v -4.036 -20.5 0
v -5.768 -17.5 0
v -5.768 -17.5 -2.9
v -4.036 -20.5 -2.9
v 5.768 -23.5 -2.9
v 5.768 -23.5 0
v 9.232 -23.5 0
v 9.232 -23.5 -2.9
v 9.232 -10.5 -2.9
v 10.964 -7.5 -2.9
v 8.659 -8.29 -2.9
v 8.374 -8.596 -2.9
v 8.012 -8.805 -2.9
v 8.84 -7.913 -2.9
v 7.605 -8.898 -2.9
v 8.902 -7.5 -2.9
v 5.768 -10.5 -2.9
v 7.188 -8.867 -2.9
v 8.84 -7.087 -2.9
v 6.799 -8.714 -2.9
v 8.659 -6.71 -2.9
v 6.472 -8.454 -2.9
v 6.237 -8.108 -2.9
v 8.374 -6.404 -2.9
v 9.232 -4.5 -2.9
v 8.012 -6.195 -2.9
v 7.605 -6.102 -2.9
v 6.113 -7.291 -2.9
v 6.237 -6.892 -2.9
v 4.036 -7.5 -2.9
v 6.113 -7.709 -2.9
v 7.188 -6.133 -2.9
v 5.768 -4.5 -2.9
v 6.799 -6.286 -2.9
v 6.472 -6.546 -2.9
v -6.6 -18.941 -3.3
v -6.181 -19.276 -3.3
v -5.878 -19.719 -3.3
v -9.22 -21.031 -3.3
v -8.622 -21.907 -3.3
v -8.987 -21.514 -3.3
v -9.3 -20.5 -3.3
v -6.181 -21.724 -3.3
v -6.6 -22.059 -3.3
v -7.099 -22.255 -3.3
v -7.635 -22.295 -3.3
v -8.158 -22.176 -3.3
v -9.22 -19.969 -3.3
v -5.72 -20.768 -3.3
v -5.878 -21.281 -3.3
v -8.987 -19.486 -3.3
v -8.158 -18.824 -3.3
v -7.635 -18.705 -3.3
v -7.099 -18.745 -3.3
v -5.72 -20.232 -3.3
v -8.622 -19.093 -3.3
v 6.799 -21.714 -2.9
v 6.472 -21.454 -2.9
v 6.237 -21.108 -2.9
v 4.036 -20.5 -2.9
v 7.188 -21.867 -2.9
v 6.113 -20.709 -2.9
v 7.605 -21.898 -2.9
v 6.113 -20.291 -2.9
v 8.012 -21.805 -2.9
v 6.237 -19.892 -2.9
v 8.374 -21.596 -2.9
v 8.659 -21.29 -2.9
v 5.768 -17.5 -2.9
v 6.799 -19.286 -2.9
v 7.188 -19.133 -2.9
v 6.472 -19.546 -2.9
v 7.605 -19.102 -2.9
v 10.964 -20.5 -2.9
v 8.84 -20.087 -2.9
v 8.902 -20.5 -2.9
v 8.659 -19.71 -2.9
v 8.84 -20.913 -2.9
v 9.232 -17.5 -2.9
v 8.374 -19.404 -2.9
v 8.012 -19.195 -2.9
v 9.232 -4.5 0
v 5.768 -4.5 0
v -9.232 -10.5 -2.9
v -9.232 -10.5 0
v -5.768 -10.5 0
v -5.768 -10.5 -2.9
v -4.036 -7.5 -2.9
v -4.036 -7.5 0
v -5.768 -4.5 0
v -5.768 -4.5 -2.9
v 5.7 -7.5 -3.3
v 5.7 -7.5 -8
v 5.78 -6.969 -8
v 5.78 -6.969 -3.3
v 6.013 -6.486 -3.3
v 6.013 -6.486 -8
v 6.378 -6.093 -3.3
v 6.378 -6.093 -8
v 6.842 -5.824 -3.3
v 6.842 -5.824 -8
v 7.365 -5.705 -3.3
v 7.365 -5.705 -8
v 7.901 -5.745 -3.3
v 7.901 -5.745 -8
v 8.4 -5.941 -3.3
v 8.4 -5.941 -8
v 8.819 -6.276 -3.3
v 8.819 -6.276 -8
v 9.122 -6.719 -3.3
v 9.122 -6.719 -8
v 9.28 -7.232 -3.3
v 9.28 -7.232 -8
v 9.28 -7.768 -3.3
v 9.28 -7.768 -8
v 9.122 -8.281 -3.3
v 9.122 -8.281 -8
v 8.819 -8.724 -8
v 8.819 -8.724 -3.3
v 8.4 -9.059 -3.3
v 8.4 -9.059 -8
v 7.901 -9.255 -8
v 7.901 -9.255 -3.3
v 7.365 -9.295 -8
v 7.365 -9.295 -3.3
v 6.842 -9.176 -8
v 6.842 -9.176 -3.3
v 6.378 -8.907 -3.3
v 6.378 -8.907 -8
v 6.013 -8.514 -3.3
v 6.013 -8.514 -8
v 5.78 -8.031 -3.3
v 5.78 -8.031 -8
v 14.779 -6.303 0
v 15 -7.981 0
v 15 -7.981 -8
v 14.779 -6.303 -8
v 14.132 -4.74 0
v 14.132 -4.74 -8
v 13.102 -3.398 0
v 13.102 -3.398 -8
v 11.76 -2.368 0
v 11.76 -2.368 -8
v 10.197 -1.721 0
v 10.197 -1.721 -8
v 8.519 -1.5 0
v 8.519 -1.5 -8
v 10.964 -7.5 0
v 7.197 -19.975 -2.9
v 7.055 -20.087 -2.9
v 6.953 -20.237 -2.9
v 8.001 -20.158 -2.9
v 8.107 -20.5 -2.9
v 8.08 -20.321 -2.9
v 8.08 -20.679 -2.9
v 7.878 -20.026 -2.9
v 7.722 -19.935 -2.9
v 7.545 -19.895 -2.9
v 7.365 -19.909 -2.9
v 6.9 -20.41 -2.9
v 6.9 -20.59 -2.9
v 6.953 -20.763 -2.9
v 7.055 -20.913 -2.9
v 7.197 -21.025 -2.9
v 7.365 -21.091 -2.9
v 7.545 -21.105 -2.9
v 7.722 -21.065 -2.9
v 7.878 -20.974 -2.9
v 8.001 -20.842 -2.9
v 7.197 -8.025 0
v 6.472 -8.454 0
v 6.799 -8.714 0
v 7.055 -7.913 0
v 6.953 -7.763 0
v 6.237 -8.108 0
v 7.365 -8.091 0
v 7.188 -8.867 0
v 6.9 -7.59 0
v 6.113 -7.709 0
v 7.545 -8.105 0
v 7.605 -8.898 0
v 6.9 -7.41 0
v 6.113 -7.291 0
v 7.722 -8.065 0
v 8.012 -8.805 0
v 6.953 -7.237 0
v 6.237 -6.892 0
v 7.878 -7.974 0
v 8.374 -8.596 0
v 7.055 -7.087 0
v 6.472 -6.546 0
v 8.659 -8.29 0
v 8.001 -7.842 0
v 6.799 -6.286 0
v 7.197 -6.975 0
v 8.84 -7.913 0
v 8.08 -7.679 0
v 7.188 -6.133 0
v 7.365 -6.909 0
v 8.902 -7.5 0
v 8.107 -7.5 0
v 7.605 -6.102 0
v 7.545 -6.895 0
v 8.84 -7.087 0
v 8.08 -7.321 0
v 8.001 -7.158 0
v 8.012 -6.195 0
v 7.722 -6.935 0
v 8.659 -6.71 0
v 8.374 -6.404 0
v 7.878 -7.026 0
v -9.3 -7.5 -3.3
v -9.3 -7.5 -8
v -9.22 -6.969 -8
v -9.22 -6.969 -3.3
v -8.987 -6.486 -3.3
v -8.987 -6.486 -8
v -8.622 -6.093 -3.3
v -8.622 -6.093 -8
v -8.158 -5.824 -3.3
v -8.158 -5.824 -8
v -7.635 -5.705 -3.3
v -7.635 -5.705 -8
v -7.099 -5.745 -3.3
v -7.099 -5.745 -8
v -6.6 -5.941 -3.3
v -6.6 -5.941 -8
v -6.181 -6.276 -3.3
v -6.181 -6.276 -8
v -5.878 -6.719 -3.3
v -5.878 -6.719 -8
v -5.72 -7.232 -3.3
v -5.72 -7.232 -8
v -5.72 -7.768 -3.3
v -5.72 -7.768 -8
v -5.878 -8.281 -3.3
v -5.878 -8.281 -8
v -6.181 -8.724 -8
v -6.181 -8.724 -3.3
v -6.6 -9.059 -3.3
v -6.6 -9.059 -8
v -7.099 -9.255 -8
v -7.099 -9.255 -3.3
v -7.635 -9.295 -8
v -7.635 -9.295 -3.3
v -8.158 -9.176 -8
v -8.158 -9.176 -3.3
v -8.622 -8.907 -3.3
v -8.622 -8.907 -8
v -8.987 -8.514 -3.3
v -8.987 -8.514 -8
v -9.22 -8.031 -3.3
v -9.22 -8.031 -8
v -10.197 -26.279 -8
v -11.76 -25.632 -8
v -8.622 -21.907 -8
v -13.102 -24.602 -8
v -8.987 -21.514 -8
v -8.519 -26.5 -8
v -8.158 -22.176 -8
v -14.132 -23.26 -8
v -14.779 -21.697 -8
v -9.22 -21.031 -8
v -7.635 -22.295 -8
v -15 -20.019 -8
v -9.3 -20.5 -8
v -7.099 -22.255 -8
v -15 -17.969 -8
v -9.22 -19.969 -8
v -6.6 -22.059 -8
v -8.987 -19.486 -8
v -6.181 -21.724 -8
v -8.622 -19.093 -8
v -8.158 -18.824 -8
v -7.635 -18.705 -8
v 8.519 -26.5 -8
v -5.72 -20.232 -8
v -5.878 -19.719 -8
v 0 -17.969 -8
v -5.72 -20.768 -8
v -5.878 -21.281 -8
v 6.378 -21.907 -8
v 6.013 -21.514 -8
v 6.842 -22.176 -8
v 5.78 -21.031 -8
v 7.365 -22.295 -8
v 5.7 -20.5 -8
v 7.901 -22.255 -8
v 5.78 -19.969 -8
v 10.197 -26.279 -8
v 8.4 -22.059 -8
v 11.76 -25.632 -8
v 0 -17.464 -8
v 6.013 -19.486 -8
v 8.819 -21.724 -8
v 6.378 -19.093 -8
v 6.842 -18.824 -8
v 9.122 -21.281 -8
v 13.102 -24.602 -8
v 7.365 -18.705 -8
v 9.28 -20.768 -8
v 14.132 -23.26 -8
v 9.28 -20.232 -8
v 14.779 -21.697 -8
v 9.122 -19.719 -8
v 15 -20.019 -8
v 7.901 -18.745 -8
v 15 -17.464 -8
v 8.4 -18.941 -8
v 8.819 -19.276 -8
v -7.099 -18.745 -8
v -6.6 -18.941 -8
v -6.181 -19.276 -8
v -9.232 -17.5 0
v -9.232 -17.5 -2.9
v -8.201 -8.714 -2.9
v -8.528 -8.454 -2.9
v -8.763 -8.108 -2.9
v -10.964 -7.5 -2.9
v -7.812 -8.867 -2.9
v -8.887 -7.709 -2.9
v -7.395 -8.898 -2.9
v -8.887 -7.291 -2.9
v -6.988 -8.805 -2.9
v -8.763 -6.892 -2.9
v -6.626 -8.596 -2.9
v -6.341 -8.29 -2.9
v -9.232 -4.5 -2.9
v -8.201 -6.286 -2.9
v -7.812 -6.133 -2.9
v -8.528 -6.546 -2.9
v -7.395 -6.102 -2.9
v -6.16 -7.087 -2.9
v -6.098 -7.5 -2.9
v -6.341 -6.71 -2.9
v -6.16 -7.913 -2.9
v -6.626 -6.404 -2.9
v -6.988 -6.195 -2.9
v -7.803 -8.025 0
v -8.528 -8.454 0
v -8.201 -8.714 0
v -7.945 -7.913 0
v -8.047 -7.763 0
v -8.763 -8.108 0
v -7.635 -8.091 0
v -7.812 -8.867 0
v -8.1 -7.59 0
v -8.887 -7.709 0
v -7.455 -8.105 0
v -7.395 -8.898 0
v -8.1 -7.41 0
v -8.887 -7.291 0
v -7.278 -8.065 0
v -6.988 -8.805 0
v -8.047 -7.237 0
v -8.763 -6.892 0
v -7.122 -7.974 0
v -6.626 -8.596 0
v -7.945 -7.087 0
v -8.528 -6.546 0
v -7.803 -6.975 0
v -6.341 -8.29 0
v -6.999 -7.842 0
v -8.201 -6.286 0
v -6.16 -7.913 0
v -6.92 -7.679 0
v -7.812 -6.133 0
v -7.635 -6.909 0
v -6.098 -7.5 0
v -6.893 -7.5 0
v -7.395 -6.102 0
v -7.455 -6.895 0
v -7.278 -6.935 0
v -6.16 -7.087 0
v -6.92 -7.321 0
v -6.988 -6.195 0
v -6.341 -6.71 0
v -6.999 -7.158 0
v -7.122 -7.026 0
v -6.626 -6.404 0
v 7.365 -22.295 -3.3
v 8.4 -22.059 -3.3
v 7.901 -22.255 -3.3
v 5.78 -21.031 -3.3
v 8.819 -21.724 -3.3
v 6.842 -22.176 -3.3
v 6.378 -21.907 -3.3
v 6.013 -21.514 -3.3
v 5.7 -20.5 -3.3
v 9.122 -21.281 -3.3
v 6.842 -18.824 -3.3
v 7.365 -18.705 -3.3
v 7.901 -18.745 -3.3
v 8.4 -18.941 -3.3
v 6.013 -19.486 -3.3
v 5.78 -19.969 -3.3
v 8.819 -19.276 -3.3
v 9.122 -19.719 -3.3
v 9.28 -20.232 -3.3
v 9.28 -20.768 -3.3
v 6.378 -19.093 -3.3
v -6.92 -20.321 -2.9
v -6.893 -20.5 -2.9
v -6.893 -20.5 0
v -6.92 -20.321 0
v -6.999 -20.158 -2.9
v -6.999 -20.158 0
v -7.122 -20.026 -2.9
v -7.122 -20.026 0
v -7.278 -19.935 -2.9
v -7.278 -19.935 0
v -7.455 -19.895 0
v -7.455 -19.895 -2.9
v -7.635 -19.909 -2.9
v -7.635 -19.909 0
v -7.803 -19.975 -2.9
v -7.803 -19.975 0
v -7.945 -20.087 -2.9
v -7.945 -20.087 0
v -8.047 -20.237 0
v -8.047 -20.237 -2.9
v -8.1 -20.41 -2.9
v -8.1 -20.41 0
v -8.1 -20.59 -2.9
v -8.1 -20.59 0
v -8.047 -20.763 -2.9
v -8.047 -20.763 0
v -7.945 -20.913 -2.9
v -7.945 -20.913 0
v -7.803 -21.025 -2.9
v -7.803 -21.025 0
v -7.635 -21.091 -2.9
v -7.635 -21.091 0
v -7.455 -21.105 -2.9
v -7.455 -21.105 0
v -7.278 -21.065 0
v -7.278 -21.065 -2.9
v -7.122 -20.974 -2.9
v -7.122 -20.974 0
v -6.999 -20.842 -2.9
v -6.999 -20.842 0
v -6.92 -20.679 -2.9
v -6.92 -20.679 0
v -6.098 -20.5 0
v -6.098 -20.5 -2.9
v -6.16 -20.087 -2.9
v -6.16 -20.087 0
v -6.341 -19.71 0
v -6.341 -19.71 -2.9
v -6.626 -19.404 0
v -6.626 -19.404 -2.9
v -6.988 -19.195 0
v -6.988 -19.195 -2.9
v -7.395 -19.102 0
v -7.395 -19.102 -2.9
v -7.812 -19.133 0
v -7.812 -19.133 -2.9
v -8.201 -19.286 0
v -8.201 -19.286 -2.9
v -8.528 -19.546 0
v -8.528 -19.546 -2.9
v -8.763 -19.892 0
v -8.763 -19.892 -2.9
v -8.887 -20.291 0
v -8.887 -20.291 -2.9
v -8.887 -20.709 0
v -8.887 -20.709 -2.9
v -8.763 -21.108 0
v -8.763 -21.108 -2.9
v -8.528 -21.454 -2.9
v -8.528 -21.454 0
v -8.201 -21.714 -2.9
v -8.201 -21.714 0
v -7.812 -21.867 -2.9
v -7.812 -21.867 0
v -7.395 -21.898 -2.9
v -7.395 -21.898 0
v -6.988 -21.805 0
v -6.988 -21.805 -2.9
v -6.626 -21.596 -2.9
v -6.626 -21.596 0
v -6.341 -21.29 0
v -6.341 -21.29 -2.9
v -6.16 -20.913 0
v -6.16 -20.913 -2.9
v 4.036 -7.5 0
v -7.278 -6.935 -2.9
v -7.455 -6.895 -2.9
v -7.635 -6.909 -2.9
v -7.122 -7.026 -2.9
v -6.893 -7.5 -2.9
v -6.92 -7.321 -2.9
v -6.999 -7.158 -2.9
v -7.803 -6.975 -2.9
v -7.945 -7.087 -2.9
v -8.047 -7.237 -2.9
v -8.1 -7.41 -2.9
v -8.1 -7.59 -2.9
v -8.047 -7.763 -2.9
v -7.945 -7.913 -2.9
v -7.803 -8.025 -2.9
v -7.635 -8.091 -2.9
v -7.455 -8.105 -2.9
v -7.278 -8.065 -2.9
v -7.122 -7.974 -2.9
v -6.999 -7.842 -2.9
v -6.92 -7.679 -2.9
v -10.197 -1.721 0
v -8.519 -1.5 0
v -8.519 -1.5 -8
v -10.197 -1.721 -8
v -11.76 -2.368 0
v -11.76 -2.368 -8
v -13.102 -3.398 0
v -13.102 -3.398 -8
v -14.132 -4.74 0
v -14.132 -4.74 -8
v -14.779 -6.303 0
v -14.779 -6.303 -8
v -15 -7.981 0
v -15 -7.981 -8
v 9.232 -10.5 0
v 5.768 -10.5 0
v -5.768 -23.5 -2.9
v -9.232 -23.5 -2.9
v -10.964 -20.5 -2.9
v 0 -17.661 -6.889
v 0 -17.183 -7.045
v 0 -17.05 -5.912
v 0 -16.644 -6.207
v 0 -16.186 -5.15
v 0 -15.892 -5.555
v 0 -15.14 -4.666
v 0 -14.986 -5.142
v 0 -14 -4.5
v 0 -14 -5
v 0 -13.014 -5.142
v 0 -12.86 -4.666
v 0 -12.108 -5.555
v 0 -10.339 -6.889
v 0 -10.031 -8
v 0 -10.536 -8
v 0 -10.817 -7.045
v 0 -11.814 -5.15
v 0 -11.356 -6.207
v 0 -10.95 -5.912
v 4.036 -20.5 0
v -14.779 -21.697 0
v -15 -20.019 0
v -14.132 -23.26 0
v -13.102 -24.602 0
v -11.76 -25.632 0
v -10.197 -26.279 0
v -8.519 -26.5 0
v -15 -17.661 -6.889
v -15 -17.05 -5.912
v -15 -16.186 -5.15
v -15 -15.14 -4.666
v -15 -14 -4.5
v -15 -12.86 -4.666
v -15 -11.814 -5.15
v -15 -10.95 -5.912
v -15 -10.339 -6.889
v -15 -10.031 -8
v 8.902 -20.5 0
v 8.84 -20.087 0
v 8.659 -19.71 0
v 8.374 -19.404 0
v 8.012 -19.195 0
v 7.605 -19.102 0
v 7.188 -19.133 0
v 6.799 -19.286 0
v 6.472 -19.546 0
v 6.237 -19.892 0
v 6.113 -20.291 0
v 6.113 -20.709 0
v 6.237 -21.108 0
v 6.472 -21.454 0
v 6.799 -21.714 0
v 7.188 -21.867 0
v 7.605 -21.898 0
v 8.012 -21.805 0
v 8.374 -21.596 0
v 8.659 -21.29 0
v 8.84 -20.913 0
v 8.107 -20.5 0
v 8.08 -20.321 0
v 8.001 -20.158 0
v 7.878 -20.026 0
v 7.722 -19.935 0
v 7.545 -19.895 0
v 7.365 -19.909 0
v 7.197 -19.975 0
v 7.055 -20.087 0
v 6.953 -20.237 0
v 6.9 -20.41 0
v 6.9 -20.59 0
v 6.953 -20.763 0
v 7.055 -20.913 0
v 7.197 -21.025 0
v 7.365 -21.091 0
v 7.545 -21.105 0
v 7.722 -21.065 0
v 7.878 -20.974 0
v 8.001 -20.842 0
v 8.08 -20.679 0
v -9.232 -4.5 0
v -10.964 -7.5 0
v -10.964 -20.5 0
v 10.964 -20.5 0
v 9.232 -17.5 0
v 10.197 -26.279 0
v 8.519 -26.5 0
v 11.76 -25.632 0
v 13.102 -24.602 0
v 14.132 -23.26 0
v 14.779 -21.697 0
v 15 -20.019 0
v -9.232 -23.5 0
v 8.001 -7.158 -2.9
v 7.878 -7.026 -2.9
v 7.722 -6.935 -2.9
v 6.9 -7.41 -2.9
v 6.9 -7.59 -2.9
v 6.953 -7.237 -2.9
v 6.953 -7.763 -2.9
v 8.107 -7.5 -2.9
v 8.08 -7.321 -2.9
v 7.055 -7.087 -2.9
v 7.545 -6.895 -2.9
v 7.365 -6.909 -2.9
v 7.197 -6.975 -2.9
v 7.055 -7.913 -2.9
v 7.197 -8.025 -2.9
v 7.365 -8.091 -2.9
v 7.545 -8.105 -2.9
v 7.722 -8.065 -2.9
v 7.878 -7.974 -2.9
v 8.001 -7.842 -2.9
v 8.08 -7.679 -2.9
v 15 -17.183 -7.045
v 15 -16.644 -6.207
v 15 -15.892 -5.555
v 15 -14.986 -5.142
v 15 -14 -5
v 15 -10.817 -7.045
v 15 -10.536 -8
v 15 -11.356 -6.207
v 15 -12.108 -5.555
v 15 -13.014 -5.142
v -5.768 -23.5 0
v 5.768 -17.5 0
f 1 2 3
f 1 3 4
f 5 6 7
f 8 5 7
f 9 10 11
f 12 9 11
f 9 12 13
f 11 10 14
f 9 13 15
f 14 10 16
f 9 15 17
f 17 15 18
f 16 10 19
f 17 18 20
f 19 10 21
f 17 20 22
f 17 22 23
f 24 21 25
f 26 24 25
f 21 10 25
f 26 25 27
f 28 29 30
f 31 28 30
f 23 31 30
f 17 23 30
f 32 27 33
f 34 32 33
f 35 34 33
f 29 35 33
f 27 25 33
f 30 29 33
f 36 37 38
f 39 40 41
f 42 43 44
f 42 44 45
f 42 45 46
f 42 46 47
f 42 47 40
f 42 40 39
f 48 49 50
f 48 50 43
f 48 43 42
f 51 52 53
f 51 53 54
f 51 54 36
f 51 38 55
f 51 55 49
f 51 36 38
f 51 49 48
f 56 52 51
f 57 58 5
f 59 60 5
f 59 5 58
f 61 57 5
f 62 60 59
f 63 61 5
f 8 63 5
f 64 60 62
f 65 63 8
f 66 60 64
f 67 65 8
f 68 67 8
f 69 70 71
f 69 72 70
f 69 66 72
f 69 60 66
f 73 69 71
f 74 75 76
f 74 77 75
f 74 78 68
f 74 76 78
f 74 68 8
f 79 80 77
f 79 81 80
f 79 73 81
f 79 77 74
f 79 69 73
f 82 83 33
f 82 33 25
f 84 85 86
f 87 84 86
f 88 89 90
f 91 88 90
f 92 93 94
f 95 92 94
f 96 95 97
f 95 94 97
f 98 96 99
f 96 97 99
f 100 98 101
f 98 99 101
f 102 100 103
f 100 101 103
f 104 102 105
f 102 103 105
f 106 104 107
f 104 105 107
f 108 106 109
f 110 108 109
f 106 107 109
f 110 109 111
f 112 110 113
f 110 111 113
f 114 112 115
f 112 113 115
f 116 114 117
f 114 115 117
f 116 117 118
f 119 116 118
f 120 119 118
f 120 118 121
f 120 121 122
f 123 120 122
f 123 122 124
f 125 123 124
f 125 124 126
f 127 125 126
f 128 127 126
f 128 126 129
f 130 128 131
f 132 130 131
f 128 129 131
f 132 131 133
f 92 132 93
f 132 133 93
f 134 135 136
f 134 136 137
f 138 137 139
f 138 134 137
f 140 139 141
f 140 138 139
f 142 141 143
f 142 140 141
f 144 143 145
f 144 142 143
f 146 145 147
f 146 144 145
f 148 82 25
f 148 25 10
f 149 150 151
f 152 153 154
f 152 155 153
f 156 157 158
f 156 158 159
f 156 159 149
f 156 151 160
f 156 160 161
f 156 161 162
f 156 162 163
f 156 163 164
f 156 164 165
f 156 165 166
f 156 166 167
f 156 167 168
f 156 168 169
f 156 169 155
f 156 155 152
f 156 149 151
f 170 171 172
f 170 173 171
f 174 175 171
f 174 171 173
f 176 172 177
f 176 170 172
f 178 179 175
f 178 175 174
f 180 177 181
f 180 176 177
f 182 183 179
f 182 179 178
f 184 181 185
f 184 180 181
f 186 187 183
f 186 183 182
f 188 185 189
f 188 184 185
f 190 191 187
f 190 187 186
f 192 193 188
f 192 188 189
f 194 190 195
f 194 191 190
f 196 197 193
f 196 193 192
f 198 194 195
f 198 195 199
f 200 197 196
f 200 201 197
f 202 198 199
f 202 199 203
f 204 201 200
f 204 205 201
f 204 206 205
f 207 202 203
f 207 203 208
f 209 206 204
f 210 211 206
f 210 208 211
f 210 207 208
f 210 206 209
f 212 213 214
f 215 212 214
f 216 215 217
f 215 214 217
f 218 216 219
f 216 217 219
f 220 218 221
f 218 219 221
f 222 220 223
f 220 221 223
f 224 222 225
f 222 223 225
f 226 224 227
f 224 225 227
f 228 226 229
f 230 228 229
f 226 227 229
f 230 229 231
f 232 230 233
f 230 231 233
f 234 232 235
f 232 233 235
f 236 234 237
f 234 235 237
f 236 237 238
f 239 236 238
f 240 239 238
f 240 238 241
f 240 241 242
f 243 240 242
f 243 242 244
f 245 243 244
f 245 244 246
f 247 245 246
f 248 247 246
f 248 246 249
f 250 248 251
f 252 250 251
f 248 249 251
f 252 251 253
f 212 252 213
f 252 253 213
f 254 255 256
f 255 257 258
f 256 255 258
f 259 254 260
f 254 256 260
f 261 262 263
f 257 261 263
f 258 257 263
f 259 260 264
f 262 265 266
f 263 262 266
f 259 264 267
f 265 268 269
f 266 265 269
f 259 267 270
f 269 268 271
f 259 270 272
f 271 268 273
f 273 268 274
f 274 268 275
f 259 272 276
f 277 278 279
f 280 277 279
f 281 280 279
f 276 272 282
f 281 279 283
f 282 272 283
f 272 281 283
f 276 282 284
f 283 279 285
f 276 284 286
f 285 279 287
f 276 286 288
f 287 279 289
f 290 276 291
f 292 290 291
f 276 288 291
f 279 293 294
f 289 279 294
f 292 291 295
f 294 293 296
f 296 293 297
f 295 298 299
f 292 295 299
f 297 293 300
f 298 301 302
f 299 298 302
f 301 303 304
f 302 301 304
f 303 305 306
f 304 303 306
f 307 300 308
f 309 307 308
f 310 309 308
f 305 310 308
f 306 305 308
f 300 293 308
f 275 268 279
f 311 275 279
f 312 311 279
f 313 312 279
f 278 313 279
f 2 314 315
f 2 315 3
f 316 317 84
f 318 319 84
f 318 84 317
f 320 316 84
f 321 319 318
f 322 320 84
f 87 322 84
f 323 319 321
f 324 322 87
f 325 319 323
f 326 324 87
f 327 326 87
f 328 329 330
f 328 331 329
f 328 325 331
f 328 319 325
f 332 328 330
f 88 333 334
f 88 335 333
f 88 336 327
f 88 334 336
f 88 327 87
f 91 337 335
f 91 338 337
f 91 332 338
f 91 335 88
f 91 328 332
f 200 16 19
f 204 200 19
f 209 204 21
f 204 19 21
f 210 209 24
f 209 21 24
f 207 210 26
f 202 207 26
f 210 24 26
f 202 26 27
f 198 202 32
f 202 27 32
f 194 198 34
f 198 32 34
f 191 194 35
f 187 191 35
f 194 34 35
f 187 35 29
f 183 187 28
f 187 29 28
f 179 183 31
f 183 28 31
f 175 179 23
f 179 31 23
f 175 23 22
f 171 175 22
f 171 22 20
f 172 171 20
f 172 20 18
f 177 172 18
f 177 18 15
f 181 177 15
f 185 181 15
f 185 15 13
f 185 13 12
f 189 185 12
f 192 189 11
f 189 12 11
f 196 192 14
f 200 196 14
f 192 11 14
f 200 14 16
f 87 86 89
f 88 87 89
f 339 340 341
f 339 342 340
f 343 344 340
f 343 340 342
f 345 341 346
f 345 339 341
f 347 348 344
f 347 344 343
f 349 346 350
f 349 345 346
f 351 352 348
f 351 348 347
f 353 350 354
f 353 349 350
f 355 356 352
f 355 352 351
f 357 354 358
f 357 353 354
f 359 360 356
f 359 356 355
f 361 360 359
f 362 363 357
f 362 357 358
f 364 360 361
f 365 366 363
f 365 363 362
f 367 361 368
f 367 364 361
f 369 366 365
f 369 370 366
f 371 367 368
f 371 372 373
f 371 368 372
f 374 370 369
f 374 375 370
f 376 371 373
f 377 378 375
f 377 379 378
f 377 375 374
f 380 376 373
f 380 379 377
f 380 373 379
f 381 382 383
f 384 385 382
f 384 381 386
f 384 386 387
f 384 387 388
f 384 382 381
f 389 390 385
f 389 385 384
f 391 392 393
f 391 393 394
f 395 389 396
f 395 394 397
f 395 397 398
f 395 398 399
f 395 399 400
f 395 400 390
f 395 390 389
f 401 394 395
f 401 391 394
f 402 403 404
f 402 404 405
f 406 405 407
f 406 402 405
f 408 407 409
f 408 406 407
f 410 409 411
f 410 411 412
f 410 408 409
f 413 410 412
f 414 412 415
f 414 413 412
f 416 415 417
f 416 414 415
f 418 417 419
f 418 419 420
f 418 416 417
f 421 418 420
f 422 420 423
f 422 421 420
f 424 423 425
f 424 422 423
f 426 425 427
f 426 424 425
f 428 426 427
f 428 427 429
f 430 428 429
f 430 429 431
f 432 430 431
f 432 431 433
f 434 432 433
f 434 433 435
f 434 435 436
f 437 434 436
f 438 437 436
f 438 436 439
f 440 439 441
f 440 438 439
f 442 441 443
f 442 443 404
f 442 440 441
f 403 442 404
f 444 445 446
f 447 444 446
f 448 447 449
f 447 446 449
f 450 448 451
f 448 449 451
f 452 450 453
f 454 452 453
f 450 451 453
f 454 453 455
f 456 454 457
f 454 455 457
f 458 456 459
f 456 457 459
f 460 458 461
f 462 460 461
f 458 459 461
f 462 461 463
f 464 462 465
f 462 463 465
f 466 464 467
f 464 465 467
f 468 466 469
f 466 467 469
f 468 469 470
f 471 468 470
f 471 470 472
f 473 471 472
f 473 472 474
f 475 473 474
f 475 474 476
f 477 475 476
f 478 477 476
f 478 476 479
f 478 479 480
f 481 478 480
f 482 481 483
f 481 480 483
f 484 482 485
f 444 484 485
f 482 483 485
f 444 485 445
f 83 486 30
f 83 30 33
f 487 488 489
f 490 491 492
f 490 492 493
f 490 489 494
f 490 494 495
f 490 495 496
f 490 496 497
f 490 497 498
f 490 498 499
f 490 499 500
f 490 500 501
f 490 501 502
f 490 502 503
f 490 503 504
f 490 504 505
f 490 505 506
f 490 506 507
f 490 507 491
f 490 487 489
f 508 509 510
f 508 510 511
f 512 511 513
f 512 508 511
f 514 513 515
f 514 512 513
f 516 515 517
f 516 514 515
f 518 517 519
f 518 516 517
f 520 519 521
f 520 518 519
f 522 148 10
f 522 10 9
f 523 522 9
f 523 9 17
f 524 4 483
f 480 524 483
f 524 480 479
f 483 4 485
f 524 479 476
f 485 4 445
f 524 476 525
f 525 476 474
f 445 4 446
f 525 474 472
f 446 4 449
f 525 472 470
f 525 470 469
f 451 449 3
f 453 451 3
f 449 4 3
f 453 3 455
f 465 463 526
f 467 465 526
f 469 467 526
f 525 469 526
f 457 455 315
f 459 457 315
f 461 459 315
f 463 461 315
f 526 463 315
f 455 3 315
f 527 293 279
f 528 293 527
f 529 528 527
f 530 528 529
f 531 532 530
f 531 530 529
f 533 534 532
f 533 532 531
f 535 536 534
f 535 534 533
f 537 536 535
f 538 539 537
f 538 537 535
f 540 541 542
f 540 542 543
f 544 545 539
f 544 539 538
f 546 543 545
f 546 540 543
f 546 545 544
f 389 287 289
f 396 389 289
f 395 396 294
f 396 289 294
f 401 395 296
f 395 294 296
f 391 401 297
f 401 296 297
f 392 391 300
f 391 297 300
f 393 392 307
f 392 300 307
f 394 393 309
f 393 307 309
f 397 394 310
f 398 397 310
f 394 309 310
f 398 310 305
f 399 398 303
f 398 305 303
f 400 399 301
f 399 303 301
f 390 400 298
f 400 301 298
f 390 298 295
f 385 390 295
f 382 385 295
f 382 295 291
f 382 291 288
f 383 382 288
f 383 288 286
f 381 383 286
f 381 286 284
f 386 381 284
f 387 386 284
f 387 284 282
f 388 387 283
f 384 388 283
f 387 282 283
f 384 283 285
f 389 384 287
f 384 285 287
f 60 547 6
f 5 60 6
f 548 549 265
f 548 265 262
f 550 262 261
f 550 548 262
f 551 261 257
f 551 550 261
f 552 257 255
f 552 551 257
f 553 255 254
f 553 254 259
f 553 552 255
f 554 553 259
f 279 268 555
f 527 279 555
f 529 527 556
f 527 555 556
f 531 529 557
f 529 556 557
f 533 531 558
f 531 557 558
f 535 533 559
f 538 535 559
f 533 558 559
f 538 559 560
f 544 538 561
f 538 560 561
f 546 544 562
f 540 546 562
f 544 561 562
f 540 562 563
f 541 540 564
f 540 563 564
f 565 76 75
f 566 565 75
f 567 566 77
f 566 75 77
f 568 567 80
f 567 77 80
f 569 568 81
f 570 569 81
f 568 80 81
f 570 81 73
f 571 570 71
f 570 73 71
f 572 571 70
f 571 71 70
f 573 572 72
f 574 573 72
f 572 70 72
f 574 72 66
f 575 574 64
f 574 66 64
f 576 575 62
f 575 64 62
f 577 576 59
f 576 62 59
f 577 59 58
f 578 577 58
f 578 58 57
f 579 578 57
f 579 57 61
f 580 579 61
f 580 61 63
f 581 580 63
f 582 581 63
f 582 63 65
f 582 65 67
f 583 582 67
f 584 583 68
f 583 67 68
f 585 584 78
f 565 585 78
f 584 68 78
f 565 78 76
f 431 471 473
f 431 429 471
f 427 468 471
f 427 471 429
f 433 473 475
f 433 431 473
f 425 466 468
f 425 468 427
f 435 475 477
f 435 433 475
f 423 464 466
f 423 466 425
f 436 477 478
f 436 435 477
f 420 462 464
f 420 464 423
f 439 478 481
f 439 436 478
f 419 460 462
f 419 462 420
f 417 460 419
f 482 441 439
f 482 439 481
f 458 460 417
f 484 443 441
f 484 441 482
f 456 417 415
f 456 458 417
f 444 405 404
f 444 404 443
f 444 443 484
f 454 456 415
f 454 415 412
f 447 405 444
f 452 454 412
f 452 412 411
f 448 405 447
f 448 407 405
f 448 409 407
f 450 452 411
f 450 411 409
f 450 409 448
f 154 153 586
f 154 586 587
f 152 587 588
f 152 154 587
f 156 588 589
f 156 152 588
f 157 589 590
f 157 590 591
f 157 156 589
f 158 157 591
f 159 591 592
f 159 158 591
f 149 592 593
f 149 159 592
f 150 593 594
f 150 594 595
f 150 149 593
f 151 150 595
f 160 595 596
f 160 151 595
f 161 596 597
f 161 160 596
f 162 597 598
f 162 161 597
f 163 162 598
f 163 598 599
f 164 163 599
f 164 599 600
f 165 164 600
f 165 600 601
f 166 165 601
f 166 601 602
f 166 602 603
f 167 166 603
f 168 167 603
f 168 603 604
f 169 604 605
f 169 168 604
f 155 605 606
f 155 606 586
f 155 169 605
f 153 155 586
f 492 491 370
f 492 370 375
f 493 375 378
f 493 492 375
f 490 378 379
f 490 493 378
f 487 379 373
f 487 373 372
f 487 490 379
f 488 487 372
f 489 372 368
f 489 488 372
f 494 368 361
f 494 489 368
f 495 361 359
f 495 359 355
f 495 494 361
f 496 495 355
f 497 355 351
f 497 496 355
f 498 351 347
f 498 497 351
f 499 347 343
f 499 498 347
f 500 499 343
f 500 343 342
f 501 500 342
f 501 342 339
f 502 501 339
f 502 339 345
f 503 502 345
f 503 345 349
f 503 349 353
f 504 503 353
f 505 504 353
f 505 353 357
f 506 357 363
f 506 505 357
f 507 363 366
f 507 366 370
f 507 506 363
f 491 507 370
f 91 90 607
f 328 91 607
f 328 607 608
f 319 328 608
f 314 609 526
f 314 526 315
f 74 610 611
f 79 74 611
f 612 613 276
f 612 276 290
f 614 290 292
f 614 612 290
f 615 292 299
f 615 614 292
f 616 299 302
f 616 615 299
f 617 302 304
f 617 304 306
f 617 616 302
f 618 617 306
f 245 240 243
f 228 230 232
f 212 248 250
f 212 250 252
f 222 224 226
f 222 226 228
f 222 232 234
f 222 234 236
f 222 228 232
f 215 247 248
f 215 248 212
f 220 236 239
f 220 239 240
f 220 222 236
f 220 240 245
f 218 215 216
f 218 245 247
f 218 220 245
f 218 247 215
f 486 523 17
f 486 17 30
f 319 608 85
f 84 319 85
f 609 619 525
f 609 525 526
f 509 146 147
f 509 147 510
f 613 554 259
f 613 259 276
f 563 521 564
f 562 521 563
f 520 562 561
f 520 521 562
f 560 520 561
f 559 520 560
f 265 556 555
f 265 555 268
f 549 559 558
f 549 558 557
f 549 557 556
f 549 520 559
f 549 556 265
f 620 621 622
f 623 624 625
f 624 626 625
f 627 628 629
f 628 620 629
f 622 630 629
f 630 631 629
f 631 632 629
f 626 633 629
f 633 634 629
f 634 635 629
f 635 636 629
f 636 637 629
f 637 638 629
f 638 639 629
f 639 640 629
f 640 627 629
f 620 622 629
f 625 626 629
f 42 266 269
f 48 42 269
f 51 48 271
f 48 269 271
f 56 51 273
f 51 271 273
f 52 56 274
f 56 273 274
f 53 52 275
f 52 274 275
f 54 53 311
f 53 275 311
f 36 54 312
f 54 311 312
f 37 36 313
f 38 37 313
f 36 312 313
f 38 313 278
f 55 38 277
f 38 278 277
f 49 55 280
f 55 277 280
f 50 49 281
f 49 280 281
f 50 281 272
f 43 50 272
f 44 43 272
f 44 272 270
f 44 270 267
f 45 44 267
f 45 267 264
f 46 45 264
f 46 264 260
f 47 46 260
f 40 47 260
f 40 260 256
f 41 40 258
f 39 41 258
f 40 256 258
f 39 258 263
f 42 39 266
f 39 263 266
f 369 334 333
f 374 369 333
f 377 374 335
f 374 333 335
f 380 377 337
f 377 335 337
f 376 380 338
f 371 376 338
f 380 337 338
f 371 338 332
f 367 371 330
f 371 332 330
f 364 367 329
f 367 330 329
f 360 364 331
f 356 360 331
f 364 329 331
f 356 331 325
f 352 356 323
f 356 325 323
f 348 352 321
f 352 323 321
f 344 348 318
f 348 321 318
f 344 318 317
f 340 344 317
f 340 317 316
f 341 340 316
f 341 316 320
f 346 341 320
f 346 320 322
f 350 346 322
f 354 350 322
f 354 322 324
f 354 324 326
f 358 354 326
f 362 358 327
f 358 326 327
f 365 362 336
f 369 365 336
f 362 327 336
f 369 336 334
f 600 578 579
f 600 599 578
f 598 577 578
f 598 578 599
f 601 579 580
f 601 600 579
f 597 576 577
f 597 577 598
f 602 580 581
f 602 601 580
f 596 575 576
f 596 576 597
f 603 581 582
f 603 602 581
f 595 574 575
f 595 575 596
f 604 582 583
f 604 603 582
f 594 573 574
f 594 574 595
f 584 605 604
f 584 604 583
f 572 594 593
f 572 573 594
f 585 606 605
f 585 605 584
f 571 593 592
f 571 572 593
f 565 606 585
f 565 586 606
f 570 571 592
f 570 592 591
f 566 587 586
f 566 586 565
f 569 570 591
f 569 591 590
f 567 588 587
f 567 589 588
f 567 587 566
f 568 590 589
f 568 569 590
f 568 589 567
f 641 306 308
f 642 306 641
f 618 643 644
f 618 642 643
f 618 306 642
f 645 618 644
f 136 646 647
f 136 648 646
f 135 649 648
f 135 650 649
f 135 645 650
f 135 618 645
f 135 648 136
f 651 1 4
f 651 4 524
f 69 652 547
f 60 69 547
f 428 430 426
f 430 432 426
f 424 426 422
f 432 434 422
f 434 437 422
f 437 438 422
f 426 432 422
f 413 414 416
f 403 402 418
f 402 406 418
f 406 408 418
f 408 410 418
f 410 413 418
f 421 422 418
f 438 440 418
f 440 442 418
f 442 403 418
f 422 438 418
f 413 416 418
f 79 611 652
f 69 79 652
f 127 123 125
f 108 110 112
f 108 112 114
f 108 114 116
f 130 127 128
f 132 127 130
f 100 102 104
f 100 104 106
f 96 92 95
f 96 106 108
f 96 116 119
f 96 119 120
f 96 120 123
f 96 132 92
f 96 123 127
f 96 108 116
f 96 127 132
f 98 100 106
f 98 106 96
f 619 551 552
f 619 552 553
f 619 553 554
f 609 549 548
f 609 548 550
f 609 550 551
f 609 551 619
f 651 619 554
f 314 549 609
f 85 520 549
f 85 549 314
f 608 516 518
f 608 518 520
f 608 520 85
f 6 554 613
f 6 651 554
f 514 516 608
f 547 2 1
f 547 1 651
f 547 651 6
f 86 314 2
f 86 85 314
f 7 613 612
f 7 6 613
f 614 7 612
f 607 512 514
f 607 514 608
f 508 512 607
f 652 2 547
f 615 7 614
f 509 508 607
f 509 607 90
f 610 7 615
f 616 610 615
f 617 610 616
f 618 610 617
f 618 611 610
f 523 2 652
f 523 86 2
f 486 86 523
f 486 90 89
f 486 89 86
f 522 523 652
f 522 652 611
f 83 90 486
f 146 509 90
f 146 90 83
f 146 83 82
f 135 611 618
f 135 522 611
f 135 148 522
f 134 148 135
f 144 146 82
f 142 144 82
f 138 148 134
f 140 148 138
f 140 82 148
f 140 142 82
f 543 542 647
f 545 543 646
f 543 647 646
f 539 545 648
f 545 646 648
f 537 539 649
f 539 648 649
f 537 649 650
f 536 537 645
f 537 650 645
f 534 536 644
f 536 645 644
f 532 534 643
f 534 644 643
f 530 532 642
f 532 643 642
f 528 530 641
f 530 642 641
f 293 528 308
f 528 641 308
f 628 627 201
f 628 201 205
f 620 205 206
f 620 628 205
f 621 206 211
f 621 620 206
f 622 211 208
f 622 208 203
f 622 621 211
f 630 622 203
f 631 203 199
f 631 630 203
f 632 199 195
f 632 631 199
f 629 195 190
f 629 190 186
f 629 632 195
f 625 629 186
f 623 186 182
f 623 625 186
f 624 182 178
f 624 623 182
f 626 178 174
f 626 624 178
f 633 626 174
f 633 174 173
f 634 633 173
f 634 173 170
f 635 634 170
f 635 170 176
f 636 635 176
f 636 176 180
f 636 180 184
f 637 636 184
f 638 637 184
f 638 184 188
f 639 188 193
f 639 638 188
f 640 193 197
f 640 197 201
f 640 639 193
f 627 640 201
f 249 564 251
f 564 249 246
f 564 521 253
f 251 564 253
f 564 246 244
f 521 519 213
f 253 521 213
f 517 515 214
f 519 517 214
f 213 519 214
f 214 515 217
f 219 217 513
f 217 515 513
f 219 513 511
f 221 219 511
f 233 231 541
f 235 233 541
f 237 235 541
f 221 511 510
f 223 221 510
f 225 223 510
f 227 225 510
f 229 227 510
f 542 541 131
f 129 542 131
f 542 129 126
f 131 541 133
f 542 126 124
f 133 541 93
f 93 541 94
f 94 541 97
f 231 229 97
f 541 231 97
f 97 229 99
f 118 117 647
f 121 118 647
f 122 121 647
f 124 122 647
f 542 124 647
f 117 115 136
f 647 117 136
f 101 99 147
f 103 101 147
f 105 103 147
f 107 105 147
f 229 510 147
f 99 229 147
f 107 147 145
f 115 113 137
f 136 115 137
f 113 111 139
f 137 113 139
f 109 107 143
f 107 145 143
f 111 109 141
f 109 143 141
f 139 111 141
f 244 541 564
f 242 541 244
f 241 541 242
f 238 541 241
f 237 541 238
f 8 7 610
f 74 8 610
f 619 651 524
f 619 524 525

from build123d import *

# Parameters (mm, degrees)
BOSS_EXTRUDE2_DEPTH = 8
SKETCH10_R          = 1.800000439
CUT_EXTRUDE5_DEPTH  = 4.7
CUT_EXTRUDE6_DEPTH  = 2.9
SKETCH12_R          = 3.5
CUT_EXTRUDE7_DEPTH  = 31
SKETCH13_R          = 4
CUT_EXTRUDE8_DEPTH  = 15
SKETCH14_R          = 1.402200439
SKETCH14_R_2        = 0.606600439
BOSS_EXTRUDE3_DEPTH = 2.9


with BuildPart() as part:
    # Sketch9 → Boss-Extrude2 (new body)
    with BuildSketch(Plane.XY):
        with BuildLine():
            Line((15, -20.019238), (15, -7.980762))
            ThreePointArc((15, -7.980762), (13.101828757, -3.398171243), (8.519238, -1.5))
            Line((8.519238, -1.5), (-8.519238, -1.5))
            ThreePointArc((-8.519238, -1.5), (-13.101828757, -3.398171243), (-15, -7.980762))
            Line((-15, -7.980762), (-15, -20.019238))
            ThreePointArc((-15, -20.019238), (-13.101828757, -24.601828757), (-8.519238, -26.5))
            Line((-8.519238, -26.5), (8.519238, -26.5))
            ThreePointArc((8.519238, -26.5), (13.101828757, -24.601828757), (15, -20.019238))
        make_face()
    extrude(amount=-BOSS_EXTRUDE2_DEPTH)

    # Sketch10 → Cut-Extrude5 (cut)
    with BuildSketch(Plane(origin=(0, 0, -8), x_dir=(-1, 0, 0), z_dir=(0, 0, -1))):
        with Locations((-7.499999289, -7.499999745)):
            Circle(SKETCH10_R)
        with Locations((7.499999289, -7.499999745)):
            Circle(SKETCH10_R)
        with Locations((7.499999289, -20.500000255)):
            Circle(SKETCH10_R)
        with Locations((-7.499999289, -20.500000255)):
            Circle(SKETCH10_R)
    extrude(amount=-CUT_EXTRUDE5_DEPTH, mode=Mode.SUBTRACT)

    # Sketch11 → Cut-Extrude6 (cut)
    with BuildSketch(Plane.XY):
        Polygon((9.232050097, -4.499999745), (10.964100904, -7.499999745), (9.232050097, -10.499999745), (5.767948482, -10.499999745), (4.035897674, -7.499999745), (5.767948482, -4.499999745), align=None)
        Polygon((-9.232050097, -23.500000255), (-10.964100904, -20.500000255), (-9.232050097, -17.500000255), (-5.767948482, -17.500000255), (-4.035897674, -20.500000255), (-5.767948482, -23.500000255), align=None)
        Polygon((10.964100904, -20.500000255), (9.232050097, -17.500000255), (5.767948482, -17.500000255), (4.035897674, -20.500000255), (5.767948482, -23.500000255), (9.232050097, -23.500000255), align=None)
        Polygon((-10.964100904, -7.499999745), (-9.232050097, -10.499999745), (-5.767948482, -10.499999745), (-4.035897674, -7.499999745), (-5.767948482, -4.499999745), (-9.232050097, -4.499999745), align=None)
    extrude(amount=-CUT_EXTRUDE6_DEPTH, mode=Mode.SUBTRACT)

    # Sketch12 → Cut-Extrude7 (cut, through all)
    with BuildSketch(Plane(origin=(15, 0, 0), x_dir=(0, 0, -1), z_dir=(1, 0, 0))):
        with Locations((8.499999447, -14)):
            Circle(SKETCH12_R)
    extrude(amount=-CUT_EXTRUDE7_DEPTH, mode=Mode.SUBTRACT)

    # Sketch13 → Cut-Extrude8 (cut)
    with BuildSketch(Plane.ZY.offset(15)):
        with Locations((-8.499999973, -14)):
            Circle(SKETCH13_R)
    extrude(amount=-CUT_EXTRUDE8_DEPTH, mode=Mode.SUBTRACT)

    # Sketch14 → Boss-Extrude3 (add)
    with BuildSketch(Plane.XY.offset(-2.9)):
        with Locations((-7.499999289, -7.499999745)):
            Circle(SKETCH14_R)
        with Locations((-7.499999289, -7.499999745)):
            Circle(SKETCH14_R_2, mode=Mode.SUBTRACT)
        with Locations((7.499999289, -7.499999745)):
            Circle(SKETCH14_R)
        with Locations((7.499999289, -7.499999745)):
            Circle(SKETCH14_R_2, mode=Mode.SUBTRACT)
        with Locations((-7.499999289, -20.500000255)):
            Circle(SKETCH14_R)
        with Locations((-7.499999289, -20.500000255)):
            Circle(SKETCH14_R_2, mode=Mode.SUBTRACT)
        with Locations((7.499999289, -20.500000255)):
            Circle(SKETCH14_R)
        with Locations((7.499999289, -20.500000255)):
            Circle(SKETCH14_R_2, mode=Mode.SUBTRACT)
    extrude(amount=BOSS_EXTRUDE3_DEPTH)


solid = part.part
